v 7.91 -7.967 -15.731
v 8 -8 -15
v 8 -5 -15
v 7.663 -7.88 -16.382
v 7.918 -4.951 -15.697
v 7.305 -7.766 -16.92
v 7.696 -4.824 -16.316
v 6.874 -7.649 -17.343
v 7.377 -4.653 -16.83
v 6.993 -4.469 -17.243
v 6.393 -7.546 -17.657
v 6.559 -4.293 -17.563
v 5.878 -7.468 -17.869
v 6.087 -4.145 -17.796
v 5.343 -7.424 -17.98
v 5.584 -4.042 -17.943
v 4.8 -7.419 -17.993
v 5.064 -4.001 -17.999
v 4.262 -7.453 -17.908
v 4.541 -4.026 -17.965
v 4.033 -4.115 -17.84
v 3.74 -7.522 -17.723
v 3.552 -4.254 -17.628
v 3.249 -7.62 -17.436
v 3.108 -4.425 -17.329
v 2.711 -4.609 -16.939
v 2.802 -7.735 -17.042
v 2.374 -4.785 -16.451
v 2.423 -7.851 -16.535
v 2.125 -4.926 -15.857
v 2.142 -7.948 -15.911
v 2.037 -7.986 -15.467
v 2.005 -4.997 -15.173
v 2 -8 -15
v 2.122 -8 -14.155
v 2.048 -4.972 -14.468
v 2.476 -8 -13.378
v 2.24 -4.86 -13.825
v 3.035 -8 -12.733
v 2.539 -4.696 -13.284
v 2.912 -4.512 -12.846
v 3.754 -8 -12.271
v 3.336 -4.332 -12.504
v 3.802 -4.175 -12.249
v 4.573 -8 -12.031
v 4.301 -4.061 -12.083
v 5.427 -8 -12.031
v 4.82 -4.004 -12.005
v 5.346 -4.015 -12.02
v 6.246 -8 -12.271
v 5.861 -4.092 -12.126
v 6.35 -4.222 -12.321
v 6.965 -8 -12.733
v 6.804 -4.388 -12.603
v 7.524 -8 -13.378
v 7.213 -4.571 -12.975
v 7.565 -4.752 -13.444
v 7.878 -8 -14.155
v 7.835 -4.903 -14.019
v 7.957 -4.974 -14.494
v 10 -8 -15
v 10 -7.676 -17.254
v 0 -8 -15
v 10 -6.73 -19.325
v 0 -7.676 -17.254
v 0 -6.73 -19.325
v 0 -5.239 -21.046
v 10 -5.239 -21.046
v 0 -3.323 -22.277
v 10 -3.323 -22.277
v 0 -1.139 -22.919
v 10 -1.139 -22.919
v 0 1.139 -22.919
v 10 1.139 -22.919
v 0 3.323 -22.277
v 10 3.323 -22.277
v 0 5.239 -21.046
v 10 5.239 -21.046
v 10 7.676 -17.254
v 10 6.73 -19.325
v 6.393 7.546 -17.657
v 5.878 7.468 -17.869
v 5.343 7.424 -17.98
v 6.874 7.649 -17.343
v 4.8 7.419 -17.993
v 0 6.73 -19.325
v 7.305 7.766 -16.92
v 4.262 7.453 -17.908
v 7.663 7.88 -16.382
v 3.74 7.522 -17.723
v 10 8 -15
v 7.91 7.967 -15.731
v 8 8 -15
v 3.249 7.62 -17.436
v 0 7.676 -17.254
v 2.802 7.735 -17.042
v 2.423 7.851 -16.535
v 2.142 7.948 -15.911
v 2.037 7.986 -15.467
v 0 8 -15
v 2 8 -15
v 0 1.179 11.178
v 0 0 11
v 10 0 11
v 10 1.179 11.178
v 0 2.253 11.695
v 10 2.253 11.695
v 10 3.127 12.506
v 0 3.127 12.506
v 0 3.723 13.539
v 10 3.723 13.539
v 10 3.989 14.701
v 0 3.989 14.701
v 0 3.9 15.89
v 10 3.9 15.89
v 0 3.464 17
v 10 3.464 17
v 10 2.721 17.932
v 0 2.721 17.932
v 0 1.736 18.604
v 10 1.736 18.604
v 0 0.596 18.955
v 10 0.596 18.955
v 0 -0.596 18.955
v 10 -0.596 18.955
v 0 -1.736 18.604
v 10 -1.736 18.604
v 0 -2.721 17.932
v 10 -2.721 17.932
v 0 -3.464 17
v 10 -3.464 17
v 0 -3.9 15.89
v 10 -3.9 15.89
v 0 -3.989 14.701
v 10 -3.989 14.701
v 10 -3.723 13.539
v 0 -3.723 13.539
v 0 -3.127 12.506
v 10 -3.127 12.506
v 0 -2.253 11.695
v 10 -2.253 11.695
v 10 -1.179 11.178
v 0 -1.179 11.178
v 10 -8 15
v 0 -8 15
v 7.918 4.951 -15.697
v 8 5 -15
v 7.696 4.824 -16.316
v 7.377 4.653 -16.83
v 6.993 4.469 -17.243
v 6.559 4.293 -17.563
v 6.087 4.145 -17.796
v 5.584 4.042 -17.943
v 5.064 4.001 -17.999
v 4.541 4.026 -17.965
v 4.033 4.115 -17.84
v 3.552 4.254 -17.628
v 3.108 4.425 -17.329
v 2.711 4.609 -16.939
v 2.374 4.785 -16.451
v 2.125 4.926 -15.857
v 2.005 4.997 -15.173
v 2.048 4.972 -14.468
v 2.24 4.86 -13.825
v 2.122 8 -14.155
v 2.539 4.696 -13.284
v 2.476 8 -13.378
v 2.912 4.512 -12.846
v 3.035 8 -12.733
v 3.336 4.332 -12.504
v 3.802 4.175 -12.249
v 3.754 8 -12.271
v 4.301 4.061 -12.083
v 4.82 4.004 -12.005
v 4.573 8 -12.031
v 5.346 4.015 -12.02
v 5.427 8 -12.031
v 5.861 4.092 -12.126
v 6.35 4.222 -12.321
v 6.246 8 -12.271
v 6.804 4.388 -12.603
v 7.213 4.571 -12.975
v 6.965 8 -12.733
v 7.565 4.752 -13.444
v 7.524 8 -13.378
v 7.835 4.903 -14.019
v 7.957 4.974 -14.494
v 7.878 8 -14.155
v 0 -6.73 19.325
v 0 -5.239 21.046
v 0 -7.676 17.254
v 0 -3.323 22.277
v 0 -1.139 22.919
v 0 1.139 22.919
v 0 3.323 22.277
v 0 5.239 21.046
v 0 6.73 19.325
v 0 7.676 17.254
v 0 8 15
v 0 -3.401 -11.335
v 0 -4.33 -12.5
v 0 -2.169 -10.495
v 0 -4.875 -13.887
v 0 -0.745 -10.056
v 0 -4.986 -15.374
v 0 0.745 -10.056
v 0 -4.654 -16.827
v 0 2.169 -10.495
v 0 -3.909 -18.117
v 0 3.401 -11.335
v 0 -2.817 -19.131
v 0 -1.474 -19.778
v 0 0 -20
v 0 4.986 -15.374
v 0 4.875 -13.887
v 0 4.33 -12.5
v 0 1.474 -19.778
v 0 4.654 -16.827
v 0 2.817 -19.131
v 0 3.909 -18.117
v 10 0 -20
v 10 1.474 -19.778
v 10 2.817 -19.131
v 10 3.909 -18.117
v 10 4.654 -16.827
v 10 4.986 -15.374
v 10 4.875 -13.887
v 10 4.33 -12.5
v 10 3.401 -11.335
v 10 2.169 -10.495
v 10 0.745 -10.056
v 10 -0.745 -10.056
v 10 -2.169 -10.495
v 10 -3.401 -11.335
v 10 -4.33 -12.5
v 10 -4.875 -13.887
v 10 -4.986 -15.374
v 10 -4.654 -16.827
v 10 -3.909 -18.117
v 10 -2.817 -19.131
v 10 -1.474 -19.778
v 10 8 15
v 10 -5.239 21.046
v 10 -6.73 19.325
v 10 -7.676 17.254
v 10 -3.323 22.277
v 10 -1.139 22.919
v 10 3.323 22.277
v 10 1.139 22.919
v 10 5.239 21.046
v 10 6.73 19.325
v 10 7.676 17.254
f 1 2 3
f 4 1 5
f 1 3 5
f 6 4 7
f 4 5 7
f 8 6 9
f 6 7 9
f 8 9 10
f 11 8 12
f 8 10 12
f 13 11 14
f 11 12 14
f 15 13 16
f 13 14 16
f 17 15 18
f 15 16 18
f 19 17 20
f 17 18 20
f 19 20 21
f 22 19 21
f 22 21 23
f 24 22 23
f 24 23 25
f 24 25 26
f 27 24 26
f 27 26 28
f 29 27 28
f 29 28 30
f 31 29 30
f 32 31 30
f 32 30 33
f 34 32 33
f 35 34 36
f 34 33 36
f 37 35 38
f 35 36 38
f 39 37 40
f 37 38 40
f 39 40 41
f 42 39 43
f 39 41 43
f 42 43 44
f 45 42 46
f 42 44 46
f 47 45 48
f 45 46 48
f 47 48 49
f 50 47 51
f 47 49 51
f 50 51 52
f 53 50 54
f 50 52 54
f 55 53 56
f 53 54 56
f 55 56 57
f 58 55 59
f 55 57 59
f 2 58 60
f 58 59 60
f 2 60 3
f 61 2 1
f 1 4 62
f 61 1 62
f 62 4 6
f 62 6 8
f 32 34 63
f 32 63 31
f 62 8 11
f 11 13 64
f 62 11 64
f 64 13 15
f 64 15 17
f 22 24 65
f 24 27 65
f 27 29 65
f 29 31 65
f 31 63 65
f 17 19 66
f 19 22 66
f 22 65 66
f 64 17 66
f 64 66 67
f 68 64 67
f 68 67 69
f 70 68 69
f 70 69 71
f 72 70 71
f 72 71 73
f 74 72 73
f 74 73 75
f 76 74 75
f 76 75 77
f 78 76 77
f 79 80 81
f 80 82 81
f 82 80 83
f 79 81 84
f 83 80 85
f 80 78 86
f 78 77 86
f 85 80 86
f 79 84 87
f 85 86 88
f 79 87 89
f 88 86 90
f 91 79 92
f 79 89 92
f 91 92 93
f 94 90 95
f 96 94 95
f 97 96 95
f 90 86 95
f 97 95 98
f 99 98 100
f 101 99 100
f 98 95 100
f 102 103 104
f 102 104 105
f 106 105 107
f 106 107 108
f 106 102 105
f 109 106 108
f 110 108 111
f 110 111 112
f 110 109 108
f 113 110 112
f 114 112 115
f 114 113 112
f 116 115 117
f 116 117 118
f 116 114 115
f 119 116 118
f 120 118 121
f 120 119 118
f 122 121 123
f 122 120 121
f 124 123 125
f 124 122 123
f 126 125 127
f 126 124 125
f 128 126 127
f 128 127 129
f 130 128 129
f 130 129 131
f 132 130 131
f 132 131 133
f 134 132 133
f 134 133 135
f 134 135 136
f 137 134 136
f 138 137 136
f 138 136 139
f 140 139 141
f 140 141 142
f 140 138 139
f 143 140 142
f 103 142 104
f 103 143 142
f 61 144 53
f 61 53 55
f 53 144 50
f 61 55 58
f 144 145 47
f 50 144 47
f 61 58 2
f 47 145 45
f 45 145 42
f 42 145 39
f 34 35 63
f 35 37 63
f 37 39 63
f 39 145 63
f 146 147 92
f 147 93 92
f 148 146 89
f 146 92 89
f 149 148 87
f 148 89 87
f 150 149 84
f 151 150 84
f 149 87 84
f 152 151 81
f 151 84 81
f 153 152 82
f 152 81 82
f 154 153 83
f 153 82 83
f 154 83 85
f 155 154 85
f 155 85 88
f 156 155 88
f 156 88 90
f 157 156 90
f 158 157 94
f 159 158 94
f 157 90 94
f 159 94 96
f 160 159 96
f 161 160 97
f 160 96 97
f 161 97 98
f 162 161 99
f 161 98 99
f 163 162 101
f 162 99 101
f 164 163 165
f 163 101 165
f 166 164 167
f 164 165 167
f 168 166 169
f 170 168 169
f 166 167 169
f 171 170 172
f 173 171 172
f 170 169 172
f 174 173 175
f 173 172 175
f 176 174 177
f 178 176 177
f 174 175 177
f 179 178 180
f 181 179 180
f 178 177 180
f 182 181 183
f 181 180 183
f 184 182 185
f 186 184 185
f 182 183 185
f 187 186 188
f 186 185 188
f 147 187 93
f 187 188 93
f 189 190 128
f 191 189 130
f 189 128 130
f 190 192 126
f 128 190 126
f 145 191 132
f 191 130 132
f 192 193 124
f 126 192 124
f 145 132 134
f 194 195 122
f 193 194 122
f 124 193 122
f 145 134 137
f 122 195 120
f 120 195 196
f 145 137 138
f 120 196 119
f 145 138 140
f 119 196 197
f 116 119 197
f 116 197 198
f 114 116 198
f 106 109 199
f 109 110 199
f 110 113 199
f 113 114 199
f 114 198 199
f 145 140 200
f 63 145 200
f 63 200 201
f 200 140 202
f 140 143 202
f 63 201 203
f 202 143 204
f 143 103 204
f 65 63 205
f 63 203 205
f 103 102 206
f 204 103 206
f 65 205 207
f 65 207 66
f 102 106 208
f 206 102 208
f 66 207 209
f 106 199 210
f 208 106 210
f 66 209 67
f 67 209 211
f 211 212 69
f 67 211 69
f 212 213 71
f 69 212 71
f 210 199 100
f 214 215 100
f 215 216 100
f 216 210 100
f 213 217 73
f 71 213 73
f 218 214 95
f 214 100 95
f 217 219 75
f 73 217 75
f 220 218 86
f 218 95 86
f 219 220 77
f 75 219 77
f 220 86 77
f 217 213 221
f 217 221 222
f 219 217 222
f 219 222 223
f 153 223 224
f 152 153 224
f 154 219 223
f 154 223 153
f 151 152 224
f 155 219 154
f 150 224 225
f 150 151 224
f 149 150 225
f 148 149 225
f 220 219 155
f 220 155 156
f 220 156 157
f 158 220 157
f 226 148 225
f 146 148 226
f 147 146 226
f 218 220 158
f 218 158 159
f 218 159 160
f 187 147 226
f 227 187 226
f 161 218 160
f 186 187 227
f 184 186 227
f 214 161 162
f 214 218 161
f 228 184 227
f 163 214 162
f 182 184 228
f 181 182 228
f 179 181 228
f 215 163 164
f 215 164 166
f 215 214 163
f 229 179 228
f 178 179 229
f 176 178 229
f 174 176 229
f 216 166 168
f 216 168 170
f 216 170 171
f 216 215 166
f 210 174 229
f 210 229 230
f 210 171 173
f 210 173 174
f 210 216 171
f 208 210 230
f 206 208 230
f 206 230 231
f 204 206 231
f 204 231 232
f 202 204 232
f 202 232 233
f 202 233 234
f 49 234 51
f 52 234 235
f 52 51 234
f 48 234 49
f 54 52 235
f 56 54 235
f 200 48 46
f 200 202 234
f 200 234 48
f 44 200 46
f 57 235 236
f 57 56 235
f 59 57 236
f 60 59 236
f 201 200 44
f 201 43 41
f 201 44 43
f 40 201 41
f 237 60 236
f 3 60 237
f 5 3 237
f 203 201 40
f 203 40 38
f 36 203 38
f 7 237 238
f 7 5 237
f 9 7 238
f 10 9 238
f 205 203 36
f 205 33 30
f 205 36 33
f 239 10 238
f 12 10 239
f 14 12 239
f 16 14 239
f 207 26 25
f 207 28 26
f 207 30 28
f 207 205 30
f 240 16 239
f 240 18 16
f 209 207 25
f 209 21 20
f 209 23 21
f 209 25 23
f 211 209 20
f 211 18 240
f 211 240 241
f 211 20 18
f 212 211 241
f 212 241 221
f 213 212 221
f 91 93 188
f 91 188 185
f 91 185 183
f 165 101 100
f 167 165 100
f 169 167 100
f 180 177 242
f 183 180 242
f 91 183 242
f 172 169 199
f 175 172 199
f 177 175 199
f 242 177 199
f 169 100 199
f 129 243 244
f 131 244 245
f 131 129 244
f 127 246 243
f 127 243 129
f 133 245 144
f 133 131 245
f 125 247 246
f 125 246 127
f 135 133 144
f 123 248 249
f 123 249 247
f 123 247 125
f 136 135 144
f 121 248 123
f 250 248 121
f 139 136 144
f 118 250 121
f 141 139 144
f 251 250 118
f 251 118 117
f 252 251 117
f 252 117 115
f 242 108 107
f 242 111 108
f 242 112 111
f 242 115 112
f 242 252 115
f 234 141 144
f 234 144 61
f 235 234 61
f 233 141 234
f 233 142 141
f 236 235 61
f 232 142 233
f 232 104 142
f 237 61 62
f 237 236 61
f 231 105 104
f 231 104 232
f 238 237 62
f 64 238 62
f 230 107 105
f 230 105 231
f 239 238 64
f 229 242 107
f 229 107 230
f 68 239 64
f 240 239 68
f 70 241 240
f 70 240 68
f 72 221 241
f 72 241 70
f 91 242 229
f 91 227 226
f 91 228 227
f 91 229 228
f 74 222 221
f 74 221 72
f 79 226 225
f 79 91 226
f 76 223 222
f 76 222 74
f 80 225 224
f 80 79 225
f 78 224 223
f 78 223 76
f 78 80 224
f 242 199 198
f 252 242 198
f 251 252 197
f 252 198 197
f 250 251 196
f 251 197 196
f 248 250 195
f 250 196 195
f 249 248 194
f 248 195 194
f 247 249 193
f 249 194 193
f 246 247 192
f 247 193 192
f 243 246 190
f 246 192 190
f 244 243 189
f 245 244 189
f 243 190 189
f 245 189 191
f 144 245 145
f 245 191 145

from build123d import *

# Parameters (mm, degrees)
SKETCH_1_R          = 4
SKETCH_1_R_2        = 5
EXTRUDE_1_DEPTH     = 10
SKETCH_2_R          = 3
CUT_EXTRUDE_1_DEPTH = 17


with BuildPart() as part:
    # 草图1 → 凸台-拉伸1 (new body)
    with BuildSketch(Plane(origin=(0, 0, 0), x_dir=(0, 0, -1), z_dir=(1, 0, 0))):
        with BuildLine():
            Line((15, 8), (-15, 8))
            ThreePointArc((-15, 8), (-23, 0), (-15, -8))
            Line((-15, -8), (15, -8))
            ThreePointArc((15, -8), (23, 0), (15, 8))
        make_face()
        with Locations((-15, 0)):
            Circle(SKETCH_1_R, mode=Mode.SUBTRACT)
        with Locations((15, 0)):
            Circle(SKETCH_1_R_2, mode=Mode.SUBTRACT)
    extrude(amount=EXTRUDE_1_DEPTH)

    # 草图2 → 切除-拉伸1 (cut, through all)
    with BuildSketch(Plane(origin=(0, 8, 0), x_dir=(1, 0, 0), z_dir=(0, 1, 0))):
        with Locations((5, 15)):
            Circle(SKETCH_2_R)
    extrude(amount=-CUT_EXTRUDE_1_DEPTH, mode=Mode.SUBTRACT)


solid = part.part
